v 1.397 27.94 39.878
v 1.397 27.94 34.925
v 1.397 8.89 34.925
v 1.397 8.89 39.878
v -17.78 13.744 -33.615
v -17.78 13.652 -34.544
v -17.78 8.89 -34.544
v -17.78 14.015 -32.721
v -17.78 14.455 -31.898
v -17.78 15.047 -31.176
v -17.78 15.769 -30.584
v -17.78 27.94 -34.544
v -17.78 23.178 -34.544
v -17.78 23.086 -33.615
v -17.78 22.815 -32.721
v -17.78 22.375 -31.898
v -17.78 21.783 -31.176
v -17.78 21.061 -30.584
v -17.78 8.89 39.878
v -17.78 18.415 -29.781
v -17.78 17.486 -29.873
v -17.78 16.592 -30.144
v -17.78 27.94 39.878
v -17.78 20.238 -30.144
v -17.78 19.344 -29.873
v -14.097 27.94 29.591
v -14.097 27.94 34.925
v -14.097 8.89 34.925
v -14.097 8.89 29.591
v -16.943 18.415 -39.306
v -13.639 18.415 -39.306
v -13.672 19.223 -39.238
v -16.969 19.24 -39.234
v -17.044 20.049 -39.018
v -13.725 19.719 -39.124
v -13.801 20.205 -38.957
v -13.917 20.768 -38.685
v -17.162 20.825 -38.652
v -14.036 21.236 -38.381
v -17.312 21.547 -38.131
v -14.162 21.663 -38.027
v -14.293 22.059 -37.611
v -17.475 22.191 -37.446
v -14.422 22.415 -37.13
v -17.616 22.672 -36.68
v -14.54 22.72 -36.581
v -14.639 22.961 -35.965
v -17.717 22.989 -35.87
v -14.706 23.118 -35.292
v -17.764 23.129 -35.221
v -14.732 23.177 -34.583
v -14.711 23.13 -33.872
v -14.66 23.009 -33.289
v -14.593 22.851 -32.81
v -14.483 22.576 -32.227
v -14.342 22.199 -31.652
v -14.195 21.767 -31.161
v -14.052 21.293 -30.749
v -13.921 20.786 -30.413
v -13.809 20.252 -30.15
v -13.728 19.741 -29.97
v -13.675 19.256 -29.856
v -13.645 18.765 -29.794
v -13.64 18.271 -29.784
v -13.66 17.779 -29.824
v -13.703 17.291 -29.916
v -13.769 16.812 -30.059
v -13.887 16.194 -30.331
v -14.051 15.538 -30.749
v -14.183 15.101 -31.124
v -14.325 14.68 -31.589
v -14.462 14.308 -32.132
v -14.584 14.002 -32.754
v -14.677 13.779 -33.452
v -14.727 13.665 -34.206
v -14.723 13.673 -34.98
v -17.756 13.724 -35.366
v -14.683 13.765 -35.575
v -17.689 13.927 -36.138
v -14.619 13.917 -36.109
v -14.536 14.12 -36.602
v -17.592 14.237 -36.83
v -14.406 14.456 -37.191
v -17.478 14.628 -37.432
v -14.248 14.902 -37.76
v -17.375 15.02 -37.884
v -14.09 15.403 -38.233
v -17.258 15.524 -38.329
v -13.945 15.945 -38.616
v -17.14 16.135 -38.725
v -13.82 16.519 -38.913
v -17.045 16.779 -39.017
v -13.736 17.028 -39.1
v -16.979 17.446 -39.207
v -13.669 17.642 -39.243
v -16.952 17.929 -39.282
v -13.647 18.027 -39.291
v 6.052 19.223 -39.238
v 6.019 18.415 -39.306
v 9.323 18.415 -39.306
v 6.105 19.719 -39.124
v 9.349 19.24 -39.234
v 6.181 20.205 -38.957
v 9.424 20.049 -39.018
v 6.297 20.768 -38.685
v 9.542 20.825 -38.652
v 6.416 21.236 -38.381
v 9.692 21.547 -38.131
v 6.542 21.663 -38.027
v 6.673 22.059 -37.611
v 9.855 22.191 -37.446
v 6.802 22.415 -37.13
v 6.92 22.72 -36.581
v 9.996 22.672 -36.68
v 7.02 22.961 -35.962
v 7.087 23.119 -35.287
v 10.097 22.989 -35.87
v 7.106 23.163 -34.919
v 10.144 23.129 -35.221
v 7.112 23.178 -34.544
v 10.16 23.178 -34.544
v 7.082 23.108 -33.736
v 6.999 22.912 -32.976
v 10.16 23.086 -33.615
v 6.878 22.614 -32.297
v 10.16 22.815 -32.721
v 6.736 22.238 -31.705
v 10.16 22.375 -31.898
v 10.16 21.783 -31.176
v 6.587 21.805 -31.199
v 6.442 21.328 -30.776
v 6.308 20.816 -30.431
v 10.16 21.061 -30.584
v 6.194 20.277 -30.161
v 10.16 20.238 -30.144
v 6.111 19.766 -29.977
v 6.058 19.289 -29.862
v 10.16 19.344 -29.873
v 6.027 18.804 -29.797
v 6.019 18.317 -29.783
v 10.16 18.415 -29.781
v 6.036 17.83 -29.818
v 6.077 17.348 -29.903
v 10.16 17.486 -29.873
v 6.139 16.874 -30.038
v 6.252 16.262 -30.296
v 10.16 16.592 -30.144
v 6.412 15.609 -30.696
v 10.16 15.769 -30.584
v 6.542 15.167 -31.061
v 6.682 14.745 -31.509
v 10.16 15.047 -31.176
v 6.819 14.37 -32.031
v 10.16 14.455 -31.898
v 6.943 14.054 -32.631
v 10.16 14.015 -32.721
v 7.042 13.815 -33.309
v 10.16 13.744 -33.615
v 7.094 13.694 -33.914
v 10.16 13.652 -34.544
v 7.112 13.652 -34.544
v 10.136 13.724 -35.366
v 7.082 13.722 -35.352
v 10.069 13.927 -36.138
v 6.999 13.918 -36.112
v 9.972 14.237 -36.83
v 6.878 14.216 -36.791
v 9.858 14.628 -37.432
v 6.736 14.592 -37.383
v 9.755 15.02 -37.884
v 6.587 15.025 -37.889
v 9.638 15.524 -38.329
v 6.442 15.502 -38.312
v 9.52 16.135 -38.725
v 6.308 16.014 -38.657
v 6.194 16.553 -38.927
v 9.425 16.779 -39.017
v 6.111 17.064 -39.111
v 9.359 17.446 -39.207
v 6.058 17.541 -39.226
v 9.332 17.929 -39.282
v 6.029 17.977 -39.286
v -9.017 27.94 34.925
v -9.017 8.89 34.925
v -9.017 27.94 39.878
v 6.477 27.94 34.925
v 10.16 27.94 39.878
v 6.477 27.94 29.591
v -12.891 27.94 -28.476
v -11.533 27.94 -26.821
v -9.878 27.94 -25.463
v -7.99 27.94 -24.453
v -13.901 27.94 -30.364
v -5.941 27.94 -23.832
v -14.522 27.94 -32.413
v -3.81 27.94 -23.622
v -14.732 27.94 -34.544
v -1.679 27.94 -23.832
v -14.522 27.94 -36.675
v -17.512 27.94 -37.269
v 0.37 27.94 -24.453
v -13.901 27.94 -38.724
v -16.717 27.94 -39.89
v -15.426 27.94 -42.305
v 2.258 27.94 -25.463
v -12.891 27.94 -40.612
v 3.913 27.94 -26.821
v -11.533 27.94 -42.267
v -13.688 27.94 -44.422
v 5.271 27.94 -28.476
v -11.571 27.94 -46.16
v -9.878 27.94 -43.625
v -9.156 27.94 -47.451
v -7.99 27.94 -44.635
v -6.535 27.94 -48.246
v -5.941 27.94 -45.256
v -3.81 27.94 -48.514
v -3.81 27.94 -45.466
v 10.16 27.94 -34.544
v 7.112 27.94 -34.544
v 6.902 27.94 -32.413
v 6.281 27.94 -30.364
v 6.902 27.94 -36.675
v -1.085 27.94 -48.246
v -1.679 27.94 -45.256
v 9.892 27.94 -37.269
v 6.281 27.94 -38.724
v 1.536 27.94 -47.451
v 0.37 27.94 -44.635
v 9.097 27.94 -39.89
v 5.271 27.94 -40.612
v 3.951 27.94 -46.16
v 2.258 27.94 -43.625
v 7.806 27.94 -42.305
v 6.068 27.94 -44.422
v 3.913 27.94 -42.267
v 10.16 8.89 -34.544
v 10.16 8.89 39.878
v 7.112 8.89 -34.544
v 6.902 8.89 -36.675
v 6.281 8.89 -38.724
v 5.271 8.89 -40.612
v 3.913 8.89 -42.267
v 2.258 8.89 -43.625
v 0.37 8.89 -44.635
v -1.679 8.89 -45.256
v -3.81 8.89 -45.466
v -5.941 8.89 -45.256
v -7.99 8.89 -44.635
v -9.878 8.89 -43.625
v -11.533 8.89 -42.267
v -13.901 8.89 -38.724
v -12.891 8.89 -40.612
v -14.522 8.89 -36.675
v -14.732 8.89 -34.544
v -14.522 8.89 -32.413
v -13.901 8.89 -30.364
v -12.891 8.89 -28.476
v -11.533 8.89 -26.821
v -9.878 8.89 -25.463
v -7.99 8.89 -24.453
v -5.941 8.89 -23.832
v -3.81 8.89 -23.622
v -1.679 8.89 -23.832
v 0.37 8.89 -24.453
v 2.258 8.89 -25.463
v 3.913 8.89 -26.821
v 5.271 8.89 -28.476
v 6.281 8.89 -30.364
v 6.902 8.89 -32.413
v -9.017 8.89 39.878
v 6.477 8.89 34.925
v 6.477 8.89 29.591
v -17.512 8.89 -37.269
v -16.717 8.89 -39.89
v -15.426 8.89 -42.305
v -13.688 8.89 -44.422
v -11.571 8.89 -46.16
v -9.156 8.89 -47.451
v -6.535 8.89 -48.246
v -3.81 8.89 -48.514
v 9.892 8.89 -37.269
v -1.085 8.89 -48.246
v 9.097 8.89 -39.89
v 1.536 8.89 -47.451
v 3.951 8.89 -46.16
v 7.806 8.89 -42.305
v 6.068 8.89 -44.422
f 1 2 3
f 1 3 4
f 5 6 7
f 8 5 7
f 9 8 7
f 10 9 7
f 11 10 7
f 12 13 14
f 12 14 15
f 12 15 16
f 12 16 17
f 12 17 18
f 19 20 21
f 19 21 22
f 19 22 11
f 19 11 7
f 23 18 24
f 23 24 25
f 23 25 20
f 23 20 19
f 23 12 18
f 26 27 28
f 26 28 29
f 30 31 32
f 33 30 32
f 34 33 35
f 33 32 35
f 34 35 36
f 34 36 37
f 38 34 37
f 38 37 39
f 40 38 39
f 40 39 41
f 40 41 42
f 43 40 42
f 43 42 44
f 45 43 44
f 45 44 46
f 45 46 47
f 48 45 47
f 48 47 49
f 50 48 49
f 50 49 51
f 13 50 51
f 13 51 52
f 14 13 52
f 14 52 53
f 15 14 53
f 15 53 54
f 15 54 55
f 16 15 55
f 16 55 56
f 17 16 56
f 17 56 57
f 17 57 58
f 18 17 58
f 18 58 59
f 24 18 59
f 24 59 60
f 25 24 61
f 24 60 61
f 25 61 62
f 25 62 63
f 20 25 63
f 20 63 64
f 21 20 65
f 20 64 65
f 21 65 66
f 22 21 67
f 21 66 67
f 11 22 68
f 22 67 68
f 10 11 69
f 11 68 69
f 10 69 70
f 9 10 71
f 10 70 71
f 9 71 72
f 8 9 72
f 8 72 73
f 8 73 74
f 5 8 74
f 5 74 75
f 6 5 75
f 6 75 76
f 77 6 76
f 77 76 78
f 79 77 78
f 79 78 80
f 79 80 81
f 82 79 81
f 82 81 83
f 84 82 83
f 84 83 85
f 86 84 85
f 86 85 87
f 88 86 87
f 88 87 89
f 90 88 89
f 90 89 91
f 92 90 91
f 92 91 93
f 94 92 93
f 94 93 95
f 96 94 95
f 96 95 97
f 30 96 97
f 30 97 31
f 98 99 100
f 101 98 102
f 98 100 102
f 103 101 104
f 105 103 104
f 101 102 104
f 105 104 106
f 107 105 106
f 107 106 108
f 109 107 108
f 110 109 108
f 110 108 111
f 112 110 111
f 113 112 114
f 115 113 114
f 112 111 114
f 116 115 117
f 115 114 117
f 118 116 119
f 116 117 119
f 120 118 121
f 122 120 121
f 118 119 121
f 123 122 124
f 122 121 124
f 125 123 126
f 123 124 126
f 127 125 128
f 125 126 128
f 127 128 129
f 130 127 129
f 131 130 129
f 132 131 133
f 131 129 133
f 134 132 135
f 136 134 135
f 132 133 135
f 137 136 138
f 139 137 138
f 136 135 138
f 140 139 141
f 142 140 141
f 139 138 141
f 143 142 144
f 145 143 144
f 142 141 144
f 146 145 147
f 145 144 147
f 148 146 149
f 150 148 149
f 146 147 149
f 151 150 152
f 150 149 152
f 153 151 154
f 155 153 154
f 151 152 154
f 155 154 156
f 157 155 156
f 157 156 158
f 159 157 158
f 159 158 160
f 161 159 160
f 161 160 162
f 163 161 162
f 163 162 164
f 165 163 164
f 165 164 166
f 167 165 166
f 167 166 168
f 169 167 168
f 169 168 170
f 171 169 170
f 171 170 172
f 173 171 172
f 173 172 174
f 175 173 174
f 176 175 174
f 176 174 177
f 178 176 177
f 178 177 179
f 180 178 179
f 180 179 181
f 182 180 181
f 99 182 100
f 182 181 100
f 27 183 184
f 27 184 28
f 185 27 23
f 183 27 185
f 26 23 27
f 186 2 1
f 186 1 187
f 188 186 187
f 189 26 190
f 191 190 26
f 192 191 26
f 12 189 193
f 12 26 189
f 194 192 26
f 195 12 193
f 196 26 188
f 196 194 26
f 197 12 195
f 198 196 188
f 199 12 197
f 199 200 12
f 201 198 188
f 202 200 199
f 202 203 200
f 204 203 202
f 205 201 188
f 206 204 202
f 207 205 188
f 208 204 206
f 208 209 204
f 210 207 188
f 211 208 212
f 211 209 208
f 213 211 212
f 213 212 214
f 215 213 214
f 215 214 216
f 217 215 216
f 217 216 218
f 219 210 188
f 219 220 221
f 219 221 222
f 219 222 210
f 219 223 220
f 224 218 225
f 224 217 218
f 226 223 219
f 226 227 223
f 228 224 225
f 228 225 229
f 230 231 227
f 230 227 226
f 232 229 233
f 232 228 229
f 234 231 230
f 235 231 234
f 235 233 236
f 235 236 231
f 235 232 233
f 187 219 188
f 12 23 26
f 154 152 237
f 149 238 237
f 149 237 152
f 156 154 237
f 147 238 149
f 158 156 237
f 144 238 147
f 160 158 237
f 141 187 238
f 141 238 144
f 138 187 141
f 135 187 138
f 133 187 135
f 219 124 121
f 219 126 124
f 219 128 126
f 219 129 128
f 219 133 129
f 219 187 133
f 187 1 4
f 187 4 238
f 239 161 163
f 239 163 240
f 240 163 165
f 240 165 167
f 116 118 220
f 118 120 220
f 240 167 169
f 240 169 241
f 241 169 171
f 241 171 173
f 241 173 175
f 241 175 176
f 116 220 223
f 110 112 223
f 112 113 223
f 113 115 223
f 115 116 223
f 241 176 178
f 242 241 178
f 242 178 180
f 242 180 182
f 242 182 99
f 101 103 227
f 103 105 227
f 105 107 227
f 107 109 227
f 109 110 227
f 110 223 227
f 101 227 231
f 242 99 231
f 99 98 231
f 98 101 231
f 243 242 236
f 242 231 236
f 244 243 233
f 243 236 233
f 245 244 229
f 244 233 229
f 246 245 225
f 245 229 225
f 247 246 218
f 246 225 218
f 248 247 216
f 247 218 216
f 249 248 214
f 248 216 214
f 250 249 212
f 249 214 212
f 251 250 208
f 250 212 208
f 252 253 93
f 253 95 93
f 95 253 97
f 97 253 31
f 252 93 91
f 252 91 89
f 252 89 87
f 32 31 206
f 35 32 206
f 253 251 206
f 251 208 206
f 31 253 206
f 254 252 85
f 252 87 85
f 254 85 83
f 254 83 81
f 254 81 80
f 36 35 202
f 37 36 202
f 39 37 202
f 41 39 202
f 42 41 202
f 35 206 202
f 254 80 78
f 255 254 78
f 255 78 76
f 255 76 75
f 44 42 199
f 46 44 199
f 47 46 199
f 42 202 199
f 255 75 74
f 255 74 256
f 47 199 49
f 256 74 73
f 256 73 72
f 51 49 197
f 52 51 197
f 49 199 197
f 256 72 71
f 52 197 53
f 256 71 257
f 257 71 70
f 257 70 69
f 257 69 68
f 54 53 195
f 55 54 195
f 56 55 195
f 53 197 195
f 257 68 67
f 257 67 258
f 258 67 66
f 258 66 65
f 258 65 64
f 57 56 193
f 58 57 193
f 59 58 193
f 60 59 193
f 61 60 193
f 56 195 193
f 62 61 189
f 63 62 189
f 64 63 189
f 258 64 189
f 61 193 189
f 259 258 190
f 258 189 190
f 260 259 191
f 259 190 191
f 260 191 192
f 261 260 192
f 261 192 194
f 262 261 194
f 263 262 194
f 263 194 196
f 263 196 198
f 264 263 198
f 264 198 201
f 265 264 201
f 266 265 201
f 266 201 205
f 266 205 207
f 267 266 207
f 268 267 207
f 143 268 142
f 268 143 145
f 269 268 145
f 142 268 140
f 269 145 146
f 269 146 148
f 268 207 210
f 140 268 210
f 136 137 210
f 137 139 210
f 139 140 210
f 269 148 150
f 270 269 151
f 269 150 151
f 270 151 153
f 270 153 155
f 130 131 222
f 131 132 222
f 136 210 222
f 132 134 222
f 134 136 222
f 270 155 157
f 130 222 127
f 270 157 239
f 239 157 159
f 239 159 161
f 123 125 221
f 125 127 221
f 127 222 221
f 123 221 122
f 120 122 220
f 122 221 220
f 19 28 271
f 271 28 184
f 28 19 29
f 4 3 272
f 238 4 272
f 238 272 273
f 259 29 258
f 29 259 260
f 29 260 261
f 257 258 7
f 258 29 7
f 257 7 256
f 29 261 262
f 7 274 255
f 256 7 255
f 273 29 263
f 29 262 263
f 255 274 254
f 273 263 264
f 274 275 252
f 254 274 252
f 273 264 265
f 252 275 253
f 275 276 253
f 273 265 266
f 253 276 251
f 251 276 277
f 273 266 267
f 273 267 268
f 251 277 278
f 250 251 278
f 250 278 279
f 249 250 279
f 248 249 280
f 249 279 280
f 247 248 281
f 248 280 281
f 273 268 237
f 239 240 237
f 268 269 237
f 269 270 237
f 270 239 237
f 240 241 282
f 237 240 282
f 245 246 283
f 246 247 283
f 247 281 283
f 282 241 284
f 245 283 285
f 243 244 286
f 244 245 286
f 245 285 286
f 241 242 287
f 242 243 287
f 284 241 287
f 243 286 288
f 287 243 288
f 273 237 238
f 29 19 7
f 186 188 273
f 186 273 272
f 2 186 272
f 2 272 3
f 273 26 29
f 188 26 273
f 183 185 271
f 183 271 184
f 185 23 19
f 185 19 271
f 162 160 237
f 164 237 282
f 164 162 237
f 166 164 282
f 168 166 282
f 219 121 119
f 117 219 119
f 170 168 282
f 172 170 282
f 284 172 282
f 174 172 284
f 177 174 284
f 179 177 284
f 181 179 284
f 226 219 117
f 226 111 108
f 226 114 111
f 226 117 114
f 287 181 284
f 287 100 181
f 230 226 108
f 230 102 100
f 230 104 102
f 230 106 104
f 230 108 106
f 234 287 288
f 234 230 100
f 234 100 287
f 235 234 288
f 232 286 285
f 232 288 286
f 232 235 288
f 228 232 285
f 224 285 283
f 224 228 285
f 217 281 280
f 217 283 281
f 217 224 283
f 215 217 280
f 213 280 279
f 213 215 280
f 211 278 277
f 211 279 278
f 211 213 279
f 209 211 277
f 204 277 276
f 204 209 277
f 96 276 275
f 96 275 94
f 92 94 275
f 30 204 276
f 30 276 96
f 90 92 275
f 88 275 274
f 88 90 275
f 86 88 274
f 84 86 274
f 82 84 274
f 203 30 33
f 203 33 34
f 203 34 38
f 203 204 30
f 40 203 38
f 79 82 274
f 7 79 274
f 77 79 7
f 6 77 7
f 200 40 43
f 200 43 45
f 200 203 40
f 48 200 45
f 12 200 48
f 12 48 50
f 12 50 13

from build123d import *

# Parameters (mm, degrees)
SKETCH2_W               = 20.32
SKETCH2_H               = 7.62
SKETCH2_R               = 1.905
BOSS_EXTRUDE1_DEPTH     = 12.7
BOSS_EXTRUDE1_2_DEPTH   = 12.7
SKETCH4_W               = 7.62
SKETCH4_H               = 55.88
BOSS_EXTRUDE2_DEPTH     = 28.702
SKETCH5_W               = 27.94
SKETCH5_H               = 55.88
BOSS_EXTRUDE3_DEPTH     = 7.62
SKETCH6_R               = 10.922
BOSS_EXTRUDE6_DEPTH     = 55.88
SKETCH7_R               = 4.7625
CUT_EXTRUDE1_DEPTH      = 1
CUT_EXTRUDE1_DEPTH_BACK = 28.94
SKETCH8_W               = 27.94
SKETCH8_H               = 55.88
CUT_EXTRUDE2_DEPTH      = 29.702
CUT_EXTRUDE3_DEPTH      = 36.83
BOSS_EXTRUDE7_DEPTH     = 19.05


with BuildPart() as part:
    # Sketch2 → Boss-Extrude1 (new body)
    with BuildSketch(Plane.XY):
        with Locations((0, 24.13)):
            Rectangle(SKETCH2_W, SKETCH2_H)
        with Locations((4.699, 24.13)):
            Circle(SKETCH2_R, mode=Mode.SUBTRACT)
        with Locations((-4.699, 24.13)):
            Circle(SKETCH2_R, mode=Mode.SUBTRACT)
    extrude(amount=BOSS_EXTRUDE1_DEPTH)



with BuildPart() as body_2:
    # Sketch2 → Boss-Extrude1 2 (new body)
    with BuildSketch(Plane.XY):
        with Locations((0, -24.13)):
            Rectangle(SKETCH2_W, SKETCH2_H)
        with Locations((-4.699, -24.13)):
            Circle(SKETCH2_R, mode=Mode.SUBTRACT)
        with Locations((4.699, -24.13)):
            Circle(SKETCH2_R, mode=Mode.SUBTRACT)
    extrude(amount=BOSS_EXTRUDE1_2_DEPTH)


with BuildPart() as part_1:
    add(part.part)

    add(body_2.part)  # Boss-Extrude2 merges body 2
    # Sketch4 → Boss-Extrude2 (add)
    with BuildSketch(Plane.XY.offset(12.7)):
        with Locations((-13.97, 0)):
            Rectangle(SKETCH4_W, SKETCH4_H)
    extrude(amount=-BOSS_EXTRUDE2_DEPTH)

    # Sketch5 → Boss-Extrude3 (add)
    with BuildSketch(Plane(origin=(0, 0, -16.002), x_dir=(-1, 0, 0), z_dir=(0, 0, -1))):
        with Locations((3.81, 0)):
            Rectangle(SKETCH5_W, SKETCH5_H)
    extrude(amount=BOSS_EXTRUDE3_DEPTH)

    # Sketch6 → Boss-Extrude6 (add)
    with BuildSketch(Plane(origin=(0, 27.94, 0), x_dir=(1, 0, 0), z_dir=(0, 1, 0))):
        with BuildLine():
            Line((4.900385525, 23.622), (10.16, 23.622))
            Line((10.16, 23.622), (10.16, 34.544))
            ThreePointArc((10.16, 34.544), (-3.81, 48.514), (-17.78, 34.544))
            Line((-17.78, 34.544), (-17.78, 23.622))
            Line((-17.78, 23.622), (-12.520385525, 23.622))
            ThreePointArc((-12.520385525, 23.622), (-3.81, 20.574), (4.900385525, 23.622))
        make_face()
        with Locations((-3.81, 34.544)):
            Circle(SKETCH6_R, mode=Mode.SUBTRACT)
    extrude(amount=-BOSS_EXTRUDE6_DEPTH)

    # Sketch7 → Cut-Extrude1 (cut, two sides)
    with BuildSketch(Plane(origin=(10.16, 0, 0), x_dir=(0, 0, -1), z_dir=(1, 0, 0))) as cut_extrude1_sk:
        with Locations((34.544, 18.415)):
            Circle(SKETCH7_R)
    extrude(amount=CUT_EXTRUDE1_DEPTH, mode=Mode.SUBTRACT)
    extrude(cut_extrude1_sk.sketch, amount=-CUT_EXTRUDE1_DEPTH_BACK, mode=Mode.SUBTRACT)

    # Sketch8 → Cut-Extrude2 (cut, through all)
    with BuildSketch(Plane.XY.offset(-16.002)):
        with Locations((-3.81, 0)):
            Rectangle(SKETCH8_W, SKETCH8_H)
    extrude(amount=CUT_EXTRUDE2_DEPTH, mode=Mode.SUBTRACT)

    # Sketch9 → Cut-Extrude3 (cut)
    with BuildSketch(Plane(origin=(0, -27.94, 0), x_dir=(-1, 0, 0), z_dir=(0, -1, 0))):
        with BuildLine():
            Line((-10.16, 16.002), (17.78, 16.002))
            Line((17.78, 16.002), (17.78, 34.544))
            ThreePointArc((17.78, 34.544), (3.81, 48.514), (-10.16, 34.544))
            Line((-10.16, 34.544), (-10.16, 16.002))
        make_face()
    extrude(amount=-CUT_EXTRUDE3_DEPTH, mode=Mode.SUBTRACT)

    # Sketch10 → Boss-Extrude7 (add)
    with BuildSketch(Plane(origin=(0, 27.94, 0), x_dir=(1, 0, 0), z_dir=(0, 1, 0))):
        Polygon((-9.017, -39.878), (-9.017, -34.925), (-14.097, -34.925), (-14.097, -29.591), (6.477, -29.591), (6.477, -34.925), (1.397, -34.925), (1.397, -39.878), (10.16, -39.878), (10.16, 16.002), (-17.78, 16.002), (-17.78, -39.878), align=None)
    extrude(amount=-BOSS_EXTRUDE7_DEPTH)


solid = part_1.part
